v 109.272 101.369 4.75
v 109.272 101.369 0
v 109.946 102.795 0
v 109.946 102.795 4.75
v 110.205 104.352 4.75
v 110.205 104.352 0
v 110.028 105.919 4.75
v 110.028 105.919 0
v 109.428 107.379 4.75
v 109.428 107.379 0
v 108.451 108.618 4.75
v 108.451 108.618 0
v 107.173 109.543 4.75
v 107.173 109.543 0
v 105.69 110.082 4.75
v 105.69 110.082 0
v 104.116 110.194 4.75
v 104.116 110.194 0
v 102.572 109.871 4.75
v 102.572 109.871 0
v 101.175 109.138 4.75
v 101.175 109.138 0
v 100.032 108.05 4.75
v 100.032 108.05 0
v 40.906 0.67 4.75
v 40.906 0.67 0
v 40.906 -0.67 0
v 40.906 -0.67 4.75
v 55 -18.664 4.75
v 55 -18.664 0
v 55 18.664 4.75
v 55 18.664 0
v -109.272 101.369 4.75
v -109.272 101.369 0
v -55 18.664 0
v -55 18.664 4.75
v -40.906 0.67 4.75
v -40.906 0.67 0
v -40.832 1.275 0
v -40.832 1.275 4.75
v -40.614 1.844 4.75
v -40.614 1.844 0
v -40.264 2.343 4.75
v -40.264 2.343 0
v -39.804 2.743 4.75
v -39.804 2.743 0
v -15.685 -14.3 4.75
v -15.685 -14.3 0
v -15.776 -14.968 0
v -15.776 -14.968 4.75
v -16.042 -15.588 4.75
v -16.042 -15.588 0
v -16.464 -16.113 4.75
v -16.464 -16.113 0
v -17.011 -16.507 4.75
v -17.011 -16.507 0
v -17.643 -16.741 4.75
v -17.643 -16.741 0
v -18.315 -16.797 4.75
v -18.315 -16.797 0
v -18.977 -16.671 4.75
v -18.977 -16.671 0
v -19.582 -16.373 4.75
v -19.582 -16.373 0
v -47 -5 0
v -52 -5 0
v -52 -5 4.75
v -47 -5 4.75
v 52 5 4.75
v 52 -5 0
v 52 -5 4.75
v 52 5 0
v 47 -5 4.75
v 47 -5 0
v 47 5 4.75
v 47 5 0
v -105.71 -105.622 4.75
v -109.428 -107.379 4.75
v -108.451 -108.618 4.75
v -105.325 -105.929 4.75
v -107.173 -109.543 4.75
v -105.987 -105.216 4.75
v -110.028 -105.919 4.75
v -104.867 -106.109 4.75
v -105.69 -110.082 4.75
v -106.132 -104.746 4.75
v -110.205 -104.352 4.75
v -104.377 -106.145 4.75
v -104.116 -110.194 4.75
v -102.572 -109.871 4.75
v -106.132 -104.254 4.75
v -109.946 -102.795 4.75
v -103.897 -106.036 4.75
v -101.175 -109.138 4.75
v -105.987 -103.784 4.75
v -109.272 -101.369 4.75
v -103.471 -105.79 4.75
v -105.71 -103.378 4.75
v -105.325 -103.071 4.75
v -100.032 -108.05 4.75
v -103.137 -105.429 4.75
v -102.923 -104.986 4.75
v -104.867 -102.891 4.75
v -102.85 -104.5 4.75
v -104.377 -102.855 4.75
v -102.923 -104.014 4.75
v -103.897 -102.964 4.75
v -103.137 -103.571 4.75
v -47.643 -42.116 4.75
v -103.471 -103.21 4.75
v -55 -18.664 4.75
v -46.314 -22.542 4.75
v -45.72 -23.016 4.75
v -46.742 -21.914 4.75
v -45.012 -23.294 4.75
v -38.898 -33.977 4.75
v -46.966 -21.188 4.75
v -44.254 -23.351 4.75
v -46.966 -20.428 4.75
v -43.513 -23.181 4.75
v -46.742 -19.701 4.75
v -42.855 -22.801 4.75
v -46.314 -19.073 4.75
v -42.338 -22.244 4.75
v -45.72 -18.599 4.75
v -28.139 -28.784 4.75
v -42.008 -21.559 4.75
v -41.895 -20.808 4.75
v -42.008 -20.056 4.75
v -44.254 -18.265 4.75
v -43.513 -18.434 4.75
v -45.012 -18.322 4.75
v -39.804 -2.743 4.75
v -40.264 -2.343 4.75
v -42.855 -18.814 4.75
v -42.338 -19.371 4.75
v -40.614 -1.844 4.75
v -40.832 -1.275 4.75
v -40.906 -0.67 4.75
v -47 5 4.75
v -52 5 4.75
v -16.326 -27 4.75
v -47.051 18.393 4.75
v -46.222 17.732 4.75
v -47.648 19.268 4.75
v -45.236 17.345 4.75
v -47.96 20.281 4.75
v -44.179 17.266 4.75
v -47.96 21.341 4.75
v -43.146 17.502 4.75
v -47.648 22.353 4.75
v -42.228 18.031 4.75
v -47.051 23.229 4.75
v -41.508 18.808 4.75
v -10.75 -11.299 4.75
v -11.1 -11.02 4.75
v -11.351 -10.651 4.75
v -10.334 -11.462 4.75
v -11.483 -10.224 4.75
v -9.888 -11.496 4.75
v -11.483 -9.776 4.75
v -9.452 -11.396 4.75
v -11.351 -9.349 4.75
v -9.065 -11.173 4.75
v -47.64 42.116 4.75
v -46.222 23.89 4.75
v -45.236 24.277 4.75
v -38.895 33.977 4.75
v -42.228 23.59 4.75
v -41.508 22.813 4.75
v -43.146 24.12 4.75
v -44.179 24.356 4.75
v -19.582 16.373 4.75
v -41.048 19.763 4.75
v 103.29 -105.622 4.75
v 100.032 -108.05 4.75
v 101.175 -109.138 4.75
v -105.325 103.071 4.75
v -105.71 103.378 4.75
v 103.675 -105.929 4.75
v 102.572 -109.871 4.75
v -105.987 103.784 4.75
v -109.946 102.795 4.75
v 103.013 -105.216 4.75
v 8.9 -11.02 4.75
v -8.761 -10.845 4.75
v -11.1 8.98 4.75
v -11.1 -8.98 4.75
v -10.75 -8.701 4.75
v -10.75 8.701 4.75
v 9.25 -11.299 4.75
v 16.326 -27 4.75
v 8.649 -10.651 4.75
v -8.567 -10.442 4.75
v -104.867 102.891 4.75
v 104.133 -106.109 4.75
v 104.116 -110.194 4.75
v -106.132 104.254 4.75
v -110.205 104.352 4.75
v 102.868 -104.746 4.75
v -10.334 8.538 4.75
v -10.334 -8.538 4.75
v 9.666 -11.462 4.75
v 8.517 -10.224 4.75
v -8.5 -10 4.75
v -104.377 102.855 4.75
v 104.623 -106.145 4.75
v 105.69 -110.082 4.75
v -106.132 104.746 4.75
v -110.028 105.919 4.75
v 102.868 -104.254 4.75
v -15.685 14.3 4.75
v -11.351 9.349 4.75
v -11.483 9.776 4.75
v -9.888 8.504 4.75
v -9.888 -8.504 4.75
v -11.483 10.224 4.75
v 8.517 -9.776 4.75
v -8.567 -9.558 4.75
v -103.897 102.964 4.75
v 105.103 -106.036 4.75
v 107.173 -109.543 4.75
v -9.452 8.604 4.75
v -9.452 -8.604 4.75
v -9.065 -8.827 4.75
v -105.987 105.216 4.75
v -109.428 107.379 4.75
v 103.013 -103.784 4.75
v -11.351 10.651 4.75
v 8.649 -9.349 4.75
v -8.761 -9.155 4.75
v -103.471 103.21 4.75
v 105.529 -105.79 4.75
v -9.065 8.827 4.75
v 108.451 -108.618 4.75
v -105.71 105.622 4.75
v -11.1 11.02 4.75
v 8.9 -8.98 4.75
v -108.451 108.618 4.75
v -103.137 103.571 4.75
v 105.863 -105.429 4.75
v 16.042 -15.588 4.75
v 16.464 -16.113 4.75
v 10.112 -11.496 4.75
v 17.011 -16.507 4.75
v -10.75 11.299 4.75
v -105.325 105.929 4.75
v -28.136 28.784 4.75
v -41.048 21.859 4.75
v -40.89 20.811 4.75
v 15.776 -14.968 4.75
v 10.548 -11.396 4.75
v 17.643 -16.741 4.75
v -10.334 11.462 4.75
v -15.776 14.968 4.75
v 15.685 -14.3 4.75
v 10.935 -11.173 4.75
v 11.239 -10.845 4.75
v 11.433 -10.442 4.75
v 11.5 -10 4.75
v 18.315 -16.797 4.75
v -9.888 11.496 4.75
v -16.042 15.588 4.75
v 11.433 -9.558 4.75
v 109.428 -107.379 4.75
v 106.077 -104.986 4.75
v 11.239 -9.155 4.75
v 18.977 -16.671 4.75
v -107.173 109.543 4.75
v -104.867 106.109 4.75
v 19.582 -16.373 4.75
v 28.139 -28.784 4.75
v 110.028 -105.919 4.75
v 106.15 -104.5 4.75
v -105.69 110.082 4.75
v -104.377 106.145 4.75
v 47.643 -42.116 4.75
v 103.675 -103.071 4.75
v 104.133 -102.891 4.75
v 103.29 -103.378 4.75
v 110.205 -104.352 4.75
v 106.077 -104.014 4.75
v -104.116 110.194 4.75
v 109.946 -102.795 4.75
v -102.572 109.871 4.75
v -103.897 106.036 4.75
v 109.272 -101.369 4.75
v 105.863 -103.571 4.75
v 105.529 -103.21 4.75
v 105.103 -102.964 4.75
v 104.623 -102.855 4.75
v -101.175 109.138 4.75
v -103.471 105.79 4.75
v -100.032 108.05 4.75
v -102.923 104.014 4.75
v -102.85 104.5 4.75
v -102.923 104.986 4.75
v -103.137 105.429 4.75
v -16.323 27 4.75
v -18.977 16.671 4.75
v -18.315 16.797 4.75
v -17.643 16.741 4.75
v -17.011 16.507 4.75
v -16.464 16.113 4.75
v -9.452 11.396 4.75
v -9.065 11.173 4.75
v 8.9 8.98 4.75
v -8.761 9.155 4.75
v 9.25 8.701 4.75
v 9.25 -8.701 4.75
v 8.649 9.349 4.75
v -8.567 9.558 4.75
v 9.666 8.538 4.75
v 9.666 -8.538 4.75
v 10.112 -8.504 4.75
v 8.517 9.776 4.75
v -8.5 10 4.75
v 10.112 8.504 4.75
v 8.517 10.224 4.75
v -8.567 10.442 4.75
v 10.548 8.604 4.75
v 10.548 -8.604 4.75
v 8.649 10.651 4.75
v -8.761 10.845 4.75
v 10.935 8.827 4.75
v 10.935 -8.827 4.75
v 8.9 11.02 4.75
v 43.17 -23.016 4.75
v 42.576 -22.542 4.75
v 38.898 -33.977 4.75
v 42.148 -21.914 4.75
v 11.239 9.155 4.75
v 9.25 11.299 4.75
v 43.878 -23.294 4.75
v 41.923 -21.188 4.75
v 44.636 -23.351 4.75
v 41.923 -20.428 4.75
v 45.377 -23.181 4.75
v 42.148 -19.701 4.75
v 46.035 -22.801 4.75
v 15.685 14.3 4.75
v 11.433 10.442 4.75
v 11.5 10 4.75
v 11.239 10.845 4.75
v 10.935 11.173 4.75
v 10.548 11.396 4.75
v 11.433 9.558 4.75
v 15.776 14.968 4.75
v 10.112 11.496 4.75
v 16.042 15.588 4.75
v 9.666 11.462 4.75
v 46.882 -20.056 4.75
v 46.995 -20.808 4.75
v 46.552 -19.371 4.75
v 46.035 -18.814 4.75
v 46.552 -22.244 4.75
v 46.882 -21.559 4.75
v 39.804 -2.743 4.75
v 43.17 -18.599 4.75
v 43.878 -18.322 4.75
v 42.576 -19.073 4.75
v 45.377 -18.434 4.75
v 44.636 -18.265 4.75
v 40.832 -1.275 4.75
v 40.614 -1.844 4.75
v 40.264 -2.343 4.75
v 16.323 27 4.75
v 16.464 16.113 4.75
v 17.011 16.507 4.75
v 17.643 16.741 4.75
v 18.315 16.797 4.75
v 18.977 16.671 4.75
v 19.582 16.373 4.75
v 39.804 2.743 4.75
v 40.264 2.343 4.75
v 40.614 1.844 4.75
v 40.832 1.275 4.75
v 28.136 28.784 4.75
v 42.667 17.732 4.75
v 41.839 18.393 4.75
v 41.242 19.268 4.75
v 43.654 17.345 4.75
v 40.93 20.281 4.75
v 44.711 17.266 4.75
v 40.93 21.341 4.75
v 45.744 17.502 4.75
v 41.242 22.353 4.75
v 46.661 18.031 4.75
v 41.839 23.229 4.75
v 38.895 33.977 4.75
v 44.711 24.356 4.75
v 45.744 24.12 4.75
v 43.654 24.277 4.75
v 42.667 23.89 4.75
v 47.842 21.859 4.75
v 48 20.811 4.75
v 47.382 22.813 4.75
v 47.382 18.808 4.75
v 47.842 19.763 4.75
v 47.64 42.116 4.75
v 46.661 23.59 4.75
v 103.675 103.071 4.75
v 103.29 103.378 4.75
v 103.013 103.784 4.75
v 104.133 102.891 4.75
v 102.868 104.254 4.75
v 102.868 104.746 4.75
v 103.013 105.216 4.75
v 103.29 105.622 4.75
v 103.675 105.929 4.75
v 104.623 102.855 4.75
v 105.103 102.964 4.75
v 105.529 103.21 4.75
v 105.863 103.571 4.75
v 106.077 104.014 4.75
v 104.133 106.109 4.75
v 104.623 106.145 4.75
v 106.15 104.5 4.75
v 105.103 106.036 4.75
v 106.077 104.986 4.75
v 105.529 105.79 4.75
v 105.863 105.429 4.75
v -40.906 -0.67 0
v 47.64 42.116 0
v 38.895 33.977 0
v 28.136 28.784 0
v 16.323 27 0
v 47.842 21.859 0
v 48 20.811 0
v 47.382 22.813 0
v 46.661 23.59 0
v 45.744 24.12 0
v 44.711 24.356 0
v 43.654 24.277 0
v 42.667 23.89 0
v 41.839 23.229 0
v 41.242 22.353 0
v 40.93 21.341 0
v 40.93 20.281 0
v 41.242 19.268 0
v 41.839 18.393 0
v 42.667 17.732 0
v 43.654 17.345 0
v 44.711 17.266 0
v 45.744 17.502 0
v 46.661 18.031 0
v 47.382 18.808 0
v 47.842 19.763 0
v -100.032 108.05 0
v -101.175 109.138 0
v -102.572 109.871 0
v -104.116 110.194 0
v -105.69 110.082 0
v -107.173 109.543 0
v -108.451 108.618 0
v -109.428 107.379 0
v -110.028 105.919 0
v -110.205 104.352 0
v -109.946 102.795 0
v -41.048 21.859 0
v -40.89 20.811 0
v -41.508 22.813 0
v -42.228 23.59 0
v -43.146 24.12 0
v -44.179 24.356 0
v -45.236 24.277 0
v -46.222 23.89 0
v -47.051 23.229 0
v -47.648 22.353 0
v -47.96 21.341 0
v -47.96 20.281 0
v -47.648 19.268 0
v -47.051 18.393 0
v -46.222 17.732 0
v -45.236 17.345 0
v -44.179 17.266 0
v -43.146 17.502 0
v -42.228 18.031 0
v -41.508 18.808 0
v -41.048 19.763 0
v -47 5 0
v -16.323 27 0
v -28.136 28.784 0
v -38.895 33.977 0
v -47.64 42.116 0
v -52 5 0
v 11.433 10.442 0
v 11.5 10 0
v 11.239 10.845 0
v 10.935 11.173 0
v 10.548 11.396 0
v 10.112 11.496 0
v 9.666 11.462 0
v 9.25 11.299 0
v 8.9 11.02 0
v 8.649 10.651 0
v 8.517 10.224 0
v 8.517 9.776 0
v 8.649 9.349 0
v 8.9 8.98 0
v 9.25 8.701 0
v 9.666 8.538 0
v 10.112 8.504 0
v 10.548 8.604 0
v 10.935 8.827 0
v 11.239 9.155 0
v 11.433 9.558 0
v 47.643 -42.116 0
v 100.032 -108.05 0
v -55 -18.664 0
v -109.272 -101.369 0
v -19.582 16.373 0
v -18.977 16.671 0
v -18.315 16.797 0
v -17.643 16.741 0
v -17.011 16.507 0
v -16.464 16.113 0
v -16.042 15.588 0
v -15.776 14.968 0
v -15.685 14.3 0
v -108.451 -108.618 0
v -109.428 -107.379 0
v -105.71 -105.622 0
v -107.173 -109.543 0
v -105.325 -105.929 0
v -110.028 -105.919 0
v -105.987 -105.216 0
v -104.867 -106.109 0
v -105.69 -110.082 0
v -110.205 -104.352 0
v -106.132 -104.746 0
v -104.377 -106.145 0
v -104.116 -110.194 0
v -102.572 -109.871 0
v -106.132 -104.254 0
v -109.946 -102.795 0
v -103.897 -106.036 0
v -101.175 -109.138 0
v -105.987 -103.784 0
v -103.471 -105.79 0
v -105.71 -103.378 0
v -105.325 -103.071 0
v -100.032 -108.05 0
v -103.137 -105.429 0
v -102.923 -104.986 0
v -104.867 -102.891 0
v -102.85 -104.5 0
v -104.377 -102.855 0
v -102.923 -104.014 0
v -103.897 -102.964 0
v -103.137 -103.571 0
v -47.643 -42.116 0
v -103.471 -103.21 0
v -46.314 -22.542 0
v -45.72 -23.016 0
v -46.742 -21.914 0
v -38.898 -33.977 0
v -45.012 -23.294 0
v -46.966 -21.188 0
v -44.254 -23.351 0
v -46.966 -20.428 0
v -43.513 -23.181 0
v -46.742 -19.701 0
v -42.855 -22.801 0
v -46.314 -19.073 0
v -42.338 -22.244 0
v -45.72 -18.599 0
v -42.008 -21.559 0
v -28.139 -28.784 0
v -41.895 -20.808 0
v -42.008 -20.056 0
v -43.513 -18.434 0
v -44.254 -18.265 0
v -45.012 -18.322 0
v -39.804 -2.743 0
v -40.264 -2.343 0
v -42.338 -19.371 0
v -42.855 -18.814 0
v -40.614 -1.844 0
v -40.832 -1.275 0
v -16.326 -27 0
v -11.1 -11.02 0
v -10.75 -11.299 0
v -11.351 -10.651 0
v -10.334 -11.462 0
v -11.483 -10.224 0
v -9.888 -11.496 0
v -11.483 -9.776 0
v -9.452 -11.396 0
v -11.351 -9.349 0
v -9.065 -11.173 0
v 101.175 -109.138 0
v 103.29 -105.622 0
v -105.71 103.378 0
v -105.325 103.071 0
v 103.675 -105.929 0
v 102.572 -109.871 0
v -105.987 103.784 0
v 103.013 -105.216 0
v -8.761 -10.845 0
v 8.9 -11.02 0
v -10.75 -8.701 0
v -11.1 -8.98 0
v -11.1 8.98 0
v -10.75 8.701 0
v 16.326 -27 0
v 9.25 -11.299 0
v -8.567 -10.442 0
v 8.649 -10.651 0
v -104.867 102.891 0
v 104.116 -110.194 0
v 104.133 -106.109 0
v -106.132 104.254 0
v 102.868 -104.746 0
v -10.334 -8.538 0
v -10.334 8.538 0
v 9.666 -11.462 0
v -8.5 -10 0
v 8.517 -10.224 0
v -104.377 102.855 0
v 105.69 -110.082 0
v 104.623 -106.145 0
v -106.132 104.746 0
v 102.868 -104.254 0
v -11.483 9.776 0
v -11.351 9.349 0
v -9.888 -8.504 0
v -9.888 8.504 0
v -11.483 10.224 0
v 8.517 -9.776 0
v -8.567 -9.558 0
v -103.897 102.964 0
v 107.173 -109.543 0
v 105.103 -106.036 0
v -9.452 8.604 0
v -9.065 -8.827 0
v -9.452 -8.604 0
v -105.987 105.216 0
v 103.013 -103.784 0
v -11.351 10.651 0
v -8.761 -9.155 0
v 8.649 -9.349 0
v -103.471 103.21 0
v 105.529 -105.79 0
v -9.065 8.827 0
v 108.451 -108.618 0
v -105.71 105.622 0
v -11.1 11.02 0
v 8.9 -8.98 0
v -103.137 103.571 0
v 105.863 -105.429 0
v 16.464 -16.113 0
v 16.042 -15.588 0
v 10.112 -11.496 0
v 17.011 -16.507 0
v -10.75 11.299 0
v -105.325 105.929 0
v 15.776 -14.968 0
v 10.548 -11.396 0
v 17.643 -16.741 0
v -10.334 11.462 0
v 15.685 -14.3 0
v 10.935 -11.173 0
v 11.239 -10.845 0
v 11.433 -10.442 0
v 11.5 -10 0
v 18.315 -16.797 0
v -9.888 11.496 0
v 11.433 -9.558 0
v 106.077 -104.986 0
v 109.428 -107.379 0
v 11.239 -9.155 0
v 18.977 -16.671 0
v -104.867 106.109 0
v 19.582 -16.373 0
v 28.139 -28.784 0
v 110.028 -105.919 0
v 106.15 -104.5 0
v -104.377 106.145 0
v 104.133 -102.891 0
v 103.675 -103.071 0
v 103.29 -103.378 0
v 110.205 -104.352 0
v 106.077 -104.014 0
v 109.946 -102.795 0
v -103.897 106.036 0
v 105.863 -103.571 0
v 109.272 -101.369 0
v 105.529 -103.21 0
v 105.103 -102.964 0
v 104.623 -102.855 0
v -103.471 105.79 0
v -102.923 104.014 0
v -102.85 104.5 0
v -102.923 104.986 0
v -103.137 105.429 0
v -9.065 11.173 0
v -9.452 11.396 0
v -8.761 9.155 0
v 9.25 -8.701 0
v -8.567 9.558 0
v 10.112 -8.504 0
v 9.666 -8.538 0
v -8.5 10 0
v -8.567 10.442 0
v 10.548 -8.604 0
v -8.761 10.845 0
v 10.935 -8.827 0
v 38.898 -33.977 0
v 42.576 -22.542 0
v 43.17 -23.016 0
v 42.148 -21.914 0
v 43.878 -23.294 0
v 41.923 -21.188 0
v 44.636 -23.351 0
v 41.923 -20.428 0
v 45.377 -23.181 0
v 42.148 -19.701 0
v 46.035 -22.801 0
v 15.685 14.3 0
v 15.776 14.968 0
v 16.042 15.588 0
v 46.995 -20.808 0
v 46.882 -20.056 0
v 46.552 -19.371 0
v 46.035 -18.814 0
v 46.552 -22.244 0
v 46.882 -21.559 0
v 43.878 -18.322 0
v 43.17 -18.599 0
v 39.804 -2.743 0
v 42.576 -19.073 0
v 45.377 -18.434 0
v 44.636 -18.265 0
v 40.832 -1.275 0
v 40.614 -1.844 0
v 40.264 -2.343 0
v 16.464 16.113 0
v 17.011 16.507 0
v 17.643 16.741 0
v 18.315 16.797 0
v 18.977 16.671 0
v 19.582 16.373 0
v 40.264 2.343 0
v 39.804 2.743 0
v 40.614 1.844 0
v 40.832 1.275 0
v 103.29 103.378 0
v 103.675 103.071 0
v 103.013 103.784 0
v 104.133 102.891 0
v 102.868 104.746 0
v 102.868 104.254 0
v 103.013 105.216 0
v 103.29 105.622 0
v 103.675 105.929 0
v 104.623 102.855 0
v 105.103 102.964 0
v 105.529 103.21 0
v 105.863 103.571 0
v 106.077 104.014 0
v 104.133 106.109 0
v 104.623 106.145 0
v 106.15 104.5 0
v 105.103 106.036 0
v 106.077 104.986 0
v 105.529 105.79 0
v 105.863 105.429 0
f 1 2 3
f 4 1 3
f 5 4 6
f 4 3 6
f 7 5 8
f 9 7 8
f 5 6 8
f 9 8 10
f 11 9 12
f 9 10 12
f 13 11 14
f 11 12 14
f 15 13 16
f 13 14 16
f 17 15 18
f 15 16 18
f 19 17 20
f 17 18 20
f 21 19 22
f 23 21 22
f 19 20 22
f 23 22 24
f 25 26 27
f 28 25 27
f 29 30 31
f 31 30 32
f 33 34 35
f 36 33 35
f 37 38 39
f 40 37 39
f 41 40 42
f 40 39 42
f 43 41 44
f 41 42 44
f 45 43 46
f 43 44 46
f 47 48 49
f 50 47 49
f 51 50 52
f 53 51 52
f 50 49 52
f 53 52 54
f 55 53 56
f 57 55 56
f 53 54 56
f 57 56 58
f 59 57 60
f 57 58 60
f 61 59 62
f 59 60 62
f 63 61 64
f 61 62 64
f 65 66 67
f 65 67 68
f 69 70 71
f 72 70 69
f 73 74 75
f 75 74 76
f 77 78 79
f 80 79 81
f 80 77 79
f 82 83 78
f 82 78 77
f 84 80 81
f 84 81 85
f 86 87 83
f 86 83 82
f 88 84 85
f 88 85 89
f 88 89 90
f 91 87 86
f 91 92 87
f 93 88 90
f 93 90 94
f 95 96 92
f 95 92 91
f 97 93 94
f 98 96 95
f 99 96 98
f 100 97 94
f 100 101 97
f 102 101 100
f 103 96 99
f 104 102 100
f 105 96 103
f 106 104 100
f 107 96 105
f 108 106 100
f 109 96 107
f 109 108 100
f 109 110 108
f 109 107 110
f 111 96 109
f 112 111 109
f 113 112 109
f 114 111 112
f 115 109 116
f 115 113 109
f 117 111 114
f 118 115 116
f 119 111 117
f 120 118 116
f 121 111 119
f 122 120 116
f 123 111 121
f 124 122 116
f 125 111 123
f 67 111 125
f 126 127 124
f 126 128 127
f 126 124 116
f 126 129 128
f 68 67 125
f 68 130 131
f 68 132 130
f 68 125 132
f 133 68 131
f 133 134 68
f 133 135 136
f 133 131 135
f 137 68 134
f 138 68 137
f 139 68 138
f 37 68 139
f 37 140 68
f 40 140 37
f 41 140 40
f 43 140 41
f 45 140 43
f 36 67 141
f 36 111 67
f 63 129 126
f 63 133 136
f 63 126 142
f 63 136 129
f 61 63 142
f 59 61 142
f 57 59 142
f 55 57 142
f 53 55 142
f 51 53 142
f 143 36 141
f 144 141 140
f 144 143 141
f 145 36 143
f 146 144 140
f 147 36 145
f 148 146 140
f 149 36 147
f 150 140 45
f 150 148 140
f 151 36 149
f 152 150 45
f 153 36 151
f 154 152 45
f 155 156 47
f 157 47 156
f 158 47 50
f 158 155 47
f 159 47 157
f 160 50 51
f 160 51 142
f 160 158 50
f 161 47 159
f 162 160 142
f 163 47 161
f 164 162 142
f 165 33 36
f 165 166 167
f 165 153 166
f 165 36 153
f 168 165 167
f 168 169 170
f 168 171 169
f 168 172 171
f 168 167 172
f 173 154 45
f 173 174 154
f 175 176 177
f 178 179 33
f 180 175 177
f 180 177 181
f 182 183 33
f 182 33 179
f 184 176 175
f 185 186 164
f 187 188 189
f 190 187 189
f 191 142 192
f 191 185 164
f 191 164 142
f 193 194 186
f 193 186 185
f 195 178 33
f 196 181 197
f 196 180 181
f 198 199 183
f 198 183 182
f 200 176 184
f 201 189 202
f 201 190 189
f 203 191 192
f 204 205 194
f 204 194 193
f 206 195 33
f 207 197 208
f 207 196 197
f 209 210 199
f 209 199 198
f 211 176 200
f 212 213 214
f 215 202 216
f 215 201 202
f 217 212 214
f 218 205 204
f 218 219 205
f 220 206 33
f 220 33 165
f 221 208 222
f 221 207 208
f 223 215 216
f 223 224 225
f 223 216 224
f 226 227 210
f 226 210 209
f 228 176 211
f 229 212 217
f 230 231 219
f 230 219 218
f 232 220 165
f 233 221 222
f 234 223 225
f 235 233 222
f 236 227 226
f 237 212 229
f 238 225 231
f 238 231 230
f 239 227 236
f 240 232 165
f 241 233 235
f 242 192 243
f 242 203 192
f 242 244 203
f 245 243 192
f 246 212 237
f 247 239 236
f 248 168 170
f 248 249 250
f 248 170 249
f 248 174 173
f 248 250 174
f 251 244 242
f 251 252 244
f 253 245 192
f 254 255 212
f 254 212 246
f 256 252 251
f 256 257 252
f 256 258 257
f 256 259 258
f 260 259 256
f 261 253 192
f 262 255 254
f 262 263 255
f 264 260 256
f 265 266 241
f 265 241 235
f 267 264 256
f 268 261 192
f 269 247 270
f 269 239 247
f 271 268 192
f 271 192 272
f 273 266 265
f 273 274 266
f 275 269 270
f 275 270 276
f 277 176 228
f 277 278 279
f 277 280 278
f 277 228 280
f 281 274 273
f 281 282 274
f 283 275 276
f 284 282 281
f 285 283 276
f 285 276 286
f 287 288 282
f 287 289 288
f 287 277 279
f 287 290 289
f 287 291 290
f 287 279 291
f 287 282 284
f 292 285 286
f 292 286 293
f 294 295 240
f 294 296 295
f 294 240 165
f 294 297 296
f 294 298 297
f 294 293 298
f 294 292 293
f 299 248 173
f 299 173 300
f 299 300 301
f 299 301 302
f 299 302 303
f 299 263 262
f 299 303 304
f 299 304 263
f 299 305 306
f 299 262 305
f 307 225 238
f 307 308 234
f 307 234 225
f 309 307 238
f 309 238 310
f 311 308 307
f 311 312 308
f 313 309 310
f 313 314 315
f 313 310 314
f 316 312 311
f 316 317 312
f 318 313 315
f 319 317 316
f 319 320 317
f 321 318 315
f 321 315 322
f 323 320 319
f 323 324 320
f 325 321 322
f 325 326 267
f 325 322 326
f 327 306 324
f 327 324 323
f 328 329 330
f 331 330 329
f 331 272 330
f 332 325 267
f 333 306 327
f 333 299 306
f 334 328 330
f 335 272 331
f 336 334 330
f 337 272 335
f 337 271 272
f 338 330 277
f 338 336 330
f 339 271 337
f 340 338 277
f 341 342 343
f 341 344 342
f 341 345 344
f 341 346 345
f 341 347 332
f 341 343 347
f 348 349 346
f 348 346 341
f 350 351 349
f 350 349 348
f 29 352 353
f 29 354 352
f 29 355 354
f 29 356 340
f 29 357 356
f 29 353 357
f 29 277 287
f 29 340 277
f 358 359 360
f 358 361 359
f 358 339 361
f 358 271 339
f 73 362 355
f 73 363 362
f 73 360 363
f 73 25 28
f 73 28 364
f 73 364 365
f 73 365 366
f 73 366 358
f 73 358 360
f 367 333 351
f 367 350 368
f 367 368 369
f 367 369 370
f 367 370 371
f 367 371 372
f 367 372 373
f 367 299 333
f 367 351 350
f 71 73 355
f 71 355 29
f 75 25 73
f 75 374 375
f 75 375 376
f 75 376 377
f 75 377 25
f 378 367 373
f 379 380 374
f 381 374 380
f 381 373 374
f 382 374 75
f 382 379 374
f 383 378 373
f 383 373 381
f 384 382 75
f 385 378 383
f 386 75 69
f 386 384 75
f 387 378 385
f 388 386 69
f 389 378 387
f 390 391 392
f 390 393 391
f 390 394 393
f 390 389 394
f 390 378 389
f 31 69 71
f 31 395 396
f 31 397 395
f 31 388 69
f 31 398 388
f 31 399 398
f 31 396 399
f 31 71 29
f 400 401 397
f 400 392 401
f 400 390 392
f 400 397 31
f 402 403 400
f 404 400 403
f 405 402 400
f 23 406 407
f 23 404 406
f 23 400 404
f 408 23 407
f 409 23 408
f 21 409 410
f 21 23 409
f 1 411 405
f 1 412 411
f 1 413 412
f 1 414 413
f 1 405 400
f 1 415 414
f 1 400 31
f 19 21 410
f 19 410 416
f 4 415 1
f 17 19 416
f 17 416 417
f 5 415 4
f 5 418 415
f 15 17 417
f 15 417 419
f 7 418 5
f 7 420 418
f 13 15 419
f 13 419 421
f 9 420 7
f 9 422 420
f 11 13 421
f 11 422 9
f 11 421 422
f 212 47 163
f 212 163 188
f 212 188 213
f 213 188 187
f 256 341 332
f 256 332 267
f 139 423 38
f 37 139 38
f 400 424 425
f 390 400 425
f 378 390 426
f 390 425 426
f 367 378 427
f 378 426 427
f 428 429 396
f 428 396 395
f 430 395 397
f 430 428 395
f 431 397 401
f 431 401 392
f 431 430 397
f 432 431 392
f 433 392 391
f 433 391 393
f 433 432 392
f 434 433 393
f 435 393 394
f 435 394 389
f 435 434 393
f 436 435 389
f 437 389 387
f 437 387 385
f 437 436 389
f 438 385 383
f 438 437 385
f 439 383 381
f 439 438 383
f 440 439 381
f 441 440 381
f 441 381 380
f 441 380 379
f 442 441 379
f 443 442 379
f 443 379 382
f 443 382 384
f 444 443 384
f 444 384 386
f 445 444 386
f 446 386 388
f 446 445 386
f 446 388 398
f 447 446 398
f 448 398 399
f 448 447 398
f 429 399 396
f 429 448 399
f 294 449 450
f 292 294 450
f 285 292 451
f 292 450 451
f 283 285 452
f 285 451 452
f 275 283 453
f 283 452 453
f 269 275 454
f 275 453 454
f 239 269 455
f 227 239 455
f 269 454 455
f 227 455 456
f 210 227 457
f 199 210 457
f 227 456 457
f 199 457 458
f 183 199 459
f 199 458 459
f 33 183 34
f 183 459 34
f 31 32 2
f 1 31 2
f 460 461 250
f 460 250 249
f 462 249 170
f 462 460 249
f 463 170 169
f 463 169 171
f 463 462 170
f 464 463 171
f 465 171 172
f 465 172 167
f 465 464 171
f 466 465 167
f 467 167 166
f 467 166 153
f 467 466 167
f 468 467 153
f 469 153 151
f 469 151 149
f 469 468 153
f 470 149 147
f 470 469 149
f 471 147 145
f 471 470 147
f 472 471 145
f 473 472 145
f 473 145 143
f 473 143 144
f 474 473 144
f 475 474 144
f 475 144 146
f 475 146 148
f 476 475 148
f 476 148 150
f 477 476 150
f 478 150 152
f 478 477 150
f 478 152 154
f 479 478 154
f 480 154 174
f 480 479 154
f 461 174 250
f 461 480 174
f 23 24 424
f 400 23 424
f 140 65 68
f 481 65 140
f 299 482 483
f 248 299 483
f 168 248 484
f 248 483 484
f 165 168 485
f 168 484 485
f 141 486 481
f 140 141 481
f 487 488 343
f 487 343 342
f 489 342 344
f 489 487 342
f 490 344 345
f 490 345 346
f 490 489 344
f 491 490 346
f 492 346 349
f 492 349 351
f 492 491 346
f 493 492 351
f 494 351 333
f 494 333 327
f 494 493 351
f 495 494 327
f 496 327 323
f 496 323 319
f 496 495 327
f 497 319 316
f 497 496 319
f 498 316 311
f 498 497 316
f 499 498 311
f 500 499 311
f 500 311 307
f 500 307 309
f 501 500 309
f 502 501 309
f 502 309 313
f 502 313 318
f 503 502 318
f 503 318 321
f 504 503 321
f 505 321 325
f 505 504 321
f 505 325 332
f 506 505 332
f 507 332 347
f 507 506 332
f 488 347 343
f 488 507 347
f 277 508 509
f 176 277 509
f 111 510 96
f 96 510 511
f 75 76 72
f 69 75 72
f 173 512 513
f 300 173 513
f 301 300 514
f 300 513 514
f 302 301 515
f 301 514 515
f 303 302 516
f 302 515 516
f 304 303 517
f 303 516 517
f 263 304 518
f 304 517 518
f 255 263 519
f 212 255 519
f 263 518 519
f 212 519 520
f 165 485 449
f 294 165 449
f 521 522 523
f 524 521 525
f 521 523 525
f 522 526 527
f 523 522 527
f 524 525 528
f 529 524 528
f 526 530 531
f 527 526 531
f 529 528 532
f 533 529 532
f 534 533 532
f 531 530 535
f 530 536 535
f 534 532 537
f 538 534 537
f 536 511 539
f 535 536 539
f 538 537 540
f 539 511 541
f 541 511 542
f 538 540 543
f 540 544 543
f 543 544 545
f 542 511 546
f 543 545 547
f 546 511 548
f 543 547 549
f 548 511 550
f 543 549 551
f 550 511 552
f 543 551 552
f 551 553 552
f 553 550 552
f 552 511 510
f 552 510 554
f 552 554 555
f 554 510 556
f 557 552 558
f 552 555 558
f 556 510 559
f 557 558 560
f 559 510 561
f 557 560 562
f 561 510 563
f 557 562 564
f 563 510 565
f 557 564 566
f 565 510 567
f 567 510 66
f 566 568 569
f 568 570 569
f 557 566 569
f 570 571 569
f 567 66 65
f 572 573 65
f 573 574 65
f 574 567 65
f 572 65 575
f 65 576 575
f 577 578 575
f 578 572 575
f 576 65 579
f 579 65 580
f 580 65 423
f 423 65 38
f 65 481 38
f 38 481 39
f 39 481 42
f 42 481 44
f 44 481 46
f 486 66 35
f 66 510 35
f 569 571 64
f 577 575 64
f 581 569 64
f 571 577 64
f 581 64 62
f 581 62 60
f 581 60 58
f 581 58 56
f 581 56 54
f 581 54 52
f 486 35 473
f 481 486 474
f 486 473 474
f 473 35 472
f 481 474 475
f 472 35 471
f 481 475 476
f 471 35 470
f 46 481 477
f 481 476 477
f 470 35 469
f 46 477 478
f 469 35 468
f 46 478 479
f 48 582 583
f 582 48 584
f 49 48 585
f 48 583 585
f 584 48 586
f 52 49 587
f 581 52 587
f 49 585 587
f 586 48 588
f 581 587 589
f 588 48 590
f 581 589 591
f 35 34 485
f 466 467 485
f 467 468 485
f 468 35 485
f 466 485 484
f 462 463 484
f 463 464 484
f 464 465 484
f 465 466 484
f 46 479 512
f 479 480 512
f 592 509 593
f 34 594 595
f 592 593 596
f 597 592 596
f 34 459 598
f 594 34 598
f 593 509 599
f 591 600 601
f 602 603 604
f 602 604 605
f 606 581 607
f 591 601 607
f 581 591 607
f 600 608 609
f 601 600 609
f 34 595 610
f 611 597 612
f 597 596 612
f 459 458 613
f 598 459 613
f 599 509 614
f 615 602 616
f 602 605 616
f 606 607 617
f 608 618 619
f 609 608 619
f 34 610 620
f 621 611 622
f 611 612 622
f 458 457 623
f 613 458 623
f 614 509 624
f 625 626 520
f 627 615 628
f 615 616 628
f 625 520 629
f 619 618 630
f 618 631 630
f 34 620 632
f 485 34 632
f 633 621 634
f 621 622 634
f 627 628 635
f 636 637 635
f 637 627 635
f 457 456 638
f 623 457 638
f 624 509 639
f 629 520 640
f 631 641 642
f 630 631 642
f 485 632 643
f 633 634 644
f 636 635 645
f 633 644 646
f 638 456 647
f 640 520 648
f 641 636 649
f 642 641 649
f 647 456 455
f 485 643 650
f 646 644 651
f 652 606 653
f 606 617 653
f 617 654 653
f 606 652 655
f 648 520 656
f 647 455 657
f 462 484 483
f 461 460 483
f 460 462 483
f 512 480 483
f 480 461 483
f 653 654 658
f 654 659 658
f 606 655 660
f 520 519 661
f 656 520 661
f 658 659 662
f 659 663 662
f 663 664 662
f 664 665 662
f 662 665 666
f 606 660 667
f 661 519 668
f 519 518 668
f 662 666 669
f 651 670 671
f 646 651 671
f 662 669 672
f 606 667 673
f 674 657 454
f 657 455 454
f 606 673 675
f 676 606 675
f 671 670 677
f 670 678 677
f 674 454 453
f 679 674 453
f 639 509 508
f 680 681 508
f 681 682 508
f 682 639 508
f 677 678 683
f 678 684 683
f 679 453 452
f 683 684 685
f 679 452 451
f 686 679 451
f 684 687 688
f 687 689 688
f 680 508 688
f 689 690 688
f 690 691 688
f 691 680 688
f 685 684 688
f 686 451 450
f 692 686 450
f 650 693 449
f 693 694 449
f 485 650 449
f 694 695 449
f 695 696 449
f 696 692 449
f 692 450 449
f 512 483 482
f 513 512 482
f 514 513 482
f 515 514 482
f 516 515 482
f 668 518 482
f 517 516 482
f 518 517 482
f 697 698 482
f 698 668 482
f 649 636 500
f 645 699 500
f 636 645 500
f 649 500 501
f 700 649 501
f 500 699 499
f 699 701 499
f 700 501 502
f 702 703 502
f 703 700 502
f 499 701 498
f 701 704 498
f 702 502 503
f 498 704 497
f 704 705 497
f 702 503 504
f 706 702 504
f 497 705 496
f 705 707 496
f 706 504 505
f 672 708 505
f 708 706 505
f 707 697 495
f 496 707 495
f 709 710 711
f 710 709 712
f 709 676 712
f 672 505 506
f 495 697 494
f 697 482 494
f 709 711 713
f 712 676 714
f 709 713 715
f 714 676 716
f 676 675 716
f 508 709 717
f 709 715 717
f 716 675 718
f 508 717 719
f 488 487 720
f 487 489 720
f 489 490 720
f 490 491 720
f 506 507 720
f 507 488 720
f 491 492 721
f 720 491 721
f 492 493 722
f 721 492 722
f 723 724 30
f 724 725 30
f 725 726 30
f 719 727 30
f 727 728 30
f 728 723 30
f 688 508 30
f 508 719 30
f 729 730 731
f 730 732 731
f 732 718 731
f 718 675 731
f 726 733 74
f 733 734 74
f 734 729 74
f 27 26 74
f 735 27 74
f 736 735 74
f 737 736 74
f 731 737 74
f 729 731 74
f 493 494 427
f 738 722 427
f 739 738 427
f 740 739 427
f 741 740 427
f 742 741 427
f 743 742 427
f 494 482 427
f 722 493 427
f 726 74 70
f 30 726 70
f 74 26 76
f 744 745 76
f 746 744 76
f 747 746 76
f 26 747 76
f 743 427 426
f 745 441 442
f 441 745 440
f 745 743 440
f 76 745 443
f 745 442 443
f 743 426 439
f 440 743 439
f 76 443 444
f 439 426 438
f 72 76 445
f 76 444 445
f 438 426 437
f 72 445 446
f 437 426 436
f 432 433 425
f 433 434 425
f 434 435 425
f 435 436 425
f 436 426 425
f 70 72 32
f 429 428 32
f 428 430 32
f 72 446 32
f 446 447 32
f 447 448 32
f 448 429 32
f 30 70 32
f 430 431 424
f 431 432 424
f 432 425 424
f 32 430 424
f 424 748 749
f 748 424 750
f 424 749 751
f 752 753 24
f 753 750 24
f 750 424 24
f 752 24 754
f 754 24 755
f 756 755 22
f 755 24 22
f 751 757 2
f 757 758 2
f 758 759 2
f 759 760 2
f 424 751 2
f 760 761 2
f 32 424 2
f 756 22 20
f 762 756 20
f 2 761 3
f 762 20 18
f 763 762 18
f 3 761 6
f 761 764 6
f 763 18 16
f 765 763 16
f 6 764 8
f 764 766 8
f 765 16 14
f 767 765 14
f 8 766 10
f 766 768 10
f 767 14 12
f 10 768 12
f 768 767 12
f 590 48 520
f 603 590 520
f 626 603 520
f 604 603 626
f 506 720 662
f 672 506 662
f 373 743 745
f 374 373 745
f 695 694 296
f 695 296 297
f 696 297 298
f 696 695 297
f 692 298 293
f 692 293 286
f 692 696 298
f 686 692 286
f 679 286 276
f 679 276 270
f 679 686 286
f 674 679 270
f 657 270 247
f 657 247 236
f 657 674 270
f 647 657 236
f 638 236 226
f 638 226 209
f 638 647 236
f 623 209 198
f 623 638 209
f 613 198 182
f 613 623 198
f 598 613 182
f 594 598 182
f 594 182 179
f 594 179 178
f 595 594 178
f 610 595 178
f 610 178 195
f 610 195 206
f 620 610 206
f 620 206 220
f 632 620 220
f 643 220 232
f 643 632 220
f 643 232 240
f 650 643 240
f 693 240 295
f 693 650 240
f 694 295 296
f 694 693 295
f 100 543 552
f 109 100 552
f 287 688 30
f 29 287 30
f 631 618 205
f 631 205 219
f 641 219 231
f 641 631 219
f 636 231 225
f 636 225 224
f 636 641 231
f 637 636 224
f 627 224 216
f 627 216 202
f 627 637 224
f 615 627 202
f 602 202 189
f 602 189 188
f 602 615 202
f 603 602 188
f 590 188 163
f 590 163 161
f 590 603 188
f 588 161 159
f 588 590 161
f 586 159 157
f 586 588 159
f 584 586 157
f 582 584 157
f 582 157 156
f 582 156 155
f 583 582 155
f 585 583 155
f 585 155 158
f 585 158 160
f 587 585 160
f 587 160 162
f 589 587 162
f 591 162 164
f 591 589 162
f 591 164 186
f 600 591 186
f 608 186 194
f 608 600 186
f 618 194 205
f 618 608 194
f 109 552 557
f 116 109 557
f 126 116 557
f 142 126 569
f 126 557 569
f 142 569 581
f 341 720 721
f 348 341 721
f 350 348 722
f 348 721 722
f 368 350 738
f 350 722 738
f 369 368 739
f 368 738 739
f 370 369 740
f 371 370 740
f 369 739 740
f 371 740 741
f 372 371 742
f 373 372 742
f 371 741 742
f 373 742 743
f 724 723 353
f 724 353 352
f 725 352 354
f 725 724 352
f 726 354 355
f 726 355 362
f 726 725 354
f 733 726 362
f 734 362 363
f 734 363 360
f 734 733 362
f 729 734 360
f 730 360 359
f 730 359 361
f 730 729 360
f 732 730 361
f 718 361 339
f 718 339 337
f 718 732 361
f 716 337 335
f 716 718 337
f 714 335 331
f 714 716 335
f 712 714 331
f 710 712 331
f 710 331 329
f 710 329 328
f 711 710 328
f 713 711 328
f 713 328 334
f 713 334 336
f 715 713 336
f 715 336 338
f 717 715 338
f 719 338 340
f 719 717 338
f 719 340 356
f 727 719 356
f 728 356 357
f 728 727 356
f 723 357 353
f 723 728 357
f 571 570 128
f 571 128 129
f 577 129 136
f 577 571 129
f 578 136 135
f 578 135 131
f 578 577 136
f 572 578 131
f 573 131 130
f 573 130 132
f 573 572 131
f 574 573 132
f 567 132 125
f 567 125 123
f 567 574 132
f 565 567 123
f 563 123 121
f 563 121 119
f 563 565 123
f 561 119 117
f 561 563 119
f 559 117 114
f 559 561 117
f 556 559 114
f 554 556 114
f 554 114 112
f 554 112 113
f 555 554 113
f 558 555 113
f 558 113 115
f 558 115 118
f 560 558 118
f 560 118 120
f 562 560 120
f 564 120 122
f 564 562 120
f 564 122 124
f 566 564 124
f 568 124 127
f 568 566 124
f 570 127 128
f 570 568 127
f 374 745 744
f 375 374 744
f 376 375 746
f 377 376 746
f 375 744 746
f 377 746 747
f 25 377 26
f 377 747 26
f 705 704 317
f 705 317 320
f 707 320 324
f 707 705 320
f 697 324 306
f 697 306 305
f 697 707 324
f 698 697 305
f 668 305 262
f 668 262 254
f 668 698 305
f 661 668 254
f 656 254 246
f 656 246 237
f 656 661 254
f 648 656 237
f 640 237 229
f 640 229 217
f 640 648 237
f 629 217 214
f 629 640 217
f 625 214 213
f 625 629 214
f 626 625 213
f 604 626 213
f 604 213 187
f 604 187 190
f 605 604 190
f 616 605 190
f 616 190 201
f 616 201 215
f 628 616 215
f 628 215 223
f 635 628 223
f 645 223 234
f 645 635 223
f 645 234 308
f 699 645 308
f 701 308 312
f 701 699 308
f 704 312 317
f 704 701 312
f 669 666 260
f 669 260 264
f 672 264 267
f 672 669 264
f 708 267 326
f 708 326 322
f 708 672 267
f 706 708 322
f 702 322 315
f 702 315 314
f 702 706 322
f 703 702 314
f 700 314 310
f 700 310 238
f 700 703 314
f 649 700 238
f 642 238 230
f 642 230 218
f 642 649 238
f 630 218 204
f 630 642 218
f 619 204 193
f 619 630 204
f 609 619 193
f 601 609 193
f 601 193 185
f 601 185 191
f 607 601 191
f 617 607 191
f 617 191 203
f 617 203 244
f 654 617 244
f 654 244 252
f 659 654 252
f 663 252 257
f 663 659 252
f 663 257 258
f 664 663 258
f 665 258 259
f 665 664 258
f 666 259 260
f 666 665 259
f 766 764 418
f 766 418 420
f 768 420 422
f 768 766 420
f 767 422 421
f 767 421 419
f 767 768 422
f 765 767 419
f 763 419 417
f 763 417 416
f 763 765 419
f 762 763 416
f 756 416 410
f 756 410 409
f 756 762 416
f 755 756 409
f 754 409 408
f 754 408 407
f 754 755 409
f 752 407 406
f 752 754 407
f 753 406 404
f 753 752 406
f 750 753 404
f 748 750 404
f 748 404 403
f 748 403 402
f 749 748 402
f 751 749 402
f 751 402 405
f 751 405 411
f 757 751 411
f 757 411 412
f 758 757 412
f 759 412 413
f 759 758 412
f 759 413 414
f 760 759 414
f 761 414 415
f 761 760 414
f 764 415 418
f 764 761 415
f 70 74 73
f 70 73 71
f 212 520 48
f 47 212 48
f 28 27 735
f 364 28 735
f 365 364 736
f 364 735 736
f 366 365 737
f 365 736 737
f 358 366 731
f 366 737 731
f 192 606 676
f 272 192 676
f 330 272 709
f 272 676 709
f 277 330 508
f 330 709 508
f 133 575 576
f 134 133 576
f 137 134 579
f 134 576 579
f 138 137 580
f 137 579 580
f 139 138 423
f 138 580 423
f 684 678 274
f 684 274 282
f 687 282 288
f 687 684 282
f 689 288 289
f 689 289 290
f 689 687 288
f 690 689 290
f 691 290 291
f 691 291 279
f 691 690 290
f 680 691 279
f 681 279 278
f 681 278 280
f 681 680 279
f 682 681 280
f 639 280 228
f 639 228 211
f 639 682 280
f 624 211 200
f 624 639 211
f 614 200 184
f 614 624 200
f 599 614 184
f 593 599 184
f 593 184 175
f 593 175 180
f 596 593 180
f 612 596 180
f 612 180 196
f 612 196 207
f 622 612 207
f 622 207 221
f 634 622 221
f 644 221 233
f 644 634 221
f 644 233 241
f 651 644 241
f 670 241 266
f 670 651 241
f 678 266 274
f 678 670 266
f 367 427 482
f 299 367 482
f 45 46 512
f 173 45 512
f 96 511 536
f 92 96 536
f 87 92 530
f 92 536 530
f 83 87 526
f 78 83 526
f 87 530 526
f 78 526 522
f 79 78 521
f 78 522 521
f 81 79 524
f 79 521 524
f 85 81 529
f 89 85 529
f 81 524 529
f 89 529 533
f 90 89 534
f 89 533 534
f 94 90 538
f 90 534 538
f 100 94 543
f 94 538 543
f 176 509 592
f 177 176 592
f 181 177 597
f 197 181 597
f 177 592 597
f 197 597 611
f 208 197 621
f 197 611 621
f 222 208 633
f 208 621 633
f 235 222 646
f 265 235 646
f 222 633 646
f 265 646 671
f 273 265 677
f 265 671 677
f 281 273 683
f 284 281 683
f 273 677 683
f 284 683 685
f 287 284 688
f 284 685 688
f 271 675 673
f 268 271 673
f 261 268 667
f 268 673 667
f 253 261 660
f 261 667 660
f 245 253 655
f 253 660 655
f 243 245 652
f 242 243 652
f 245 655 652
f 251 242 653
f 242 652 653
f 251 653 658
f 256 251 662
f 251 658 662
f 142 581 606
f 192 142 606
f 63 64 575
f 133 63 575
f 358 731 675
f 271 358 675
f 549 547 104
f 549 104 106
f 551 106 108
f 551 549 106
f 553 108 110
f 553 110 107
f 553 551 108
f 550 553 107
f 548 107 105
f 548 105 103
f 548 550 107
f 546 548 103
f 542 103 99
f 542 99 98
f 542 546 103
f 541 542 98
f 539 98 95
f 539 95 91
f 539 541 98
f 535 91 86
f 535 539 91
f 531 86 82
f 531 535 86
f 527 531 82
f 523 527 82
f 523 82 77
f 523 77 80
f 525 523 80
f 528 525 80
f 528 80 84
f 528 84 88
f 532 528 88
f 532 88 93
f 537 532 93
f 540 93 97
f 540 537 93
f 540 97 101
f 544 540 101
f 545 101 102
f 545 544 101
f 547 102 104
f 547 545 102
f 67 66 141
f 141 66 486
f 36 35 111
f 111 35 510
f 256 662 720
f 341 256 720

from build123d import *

# Parameters (mm, degrees)
F0_R     = 1.65
F0_R_2   = 2.55
F0_W     = 5
F0_H     = 10
F0_R_3   = 1.5
F0_R_4   = 3.555
F1_DEPTH = 4.75


# Not quite as in the source:
# - ends of sketch curves that miss each other by under 0.0002 mm in the source are joined


with BuildPart() as f1:
    # F0 (on Top) → F1 (new body)
    with BuildSketch(Plane.XY):
        with BuildLine():
            Line((-47.640397, 42.115595), (-100.031737, 108.050449))
            ThreePointArc((-100.031737, 108.050449), (-107.8442155419, 109.1246397394), (-109.2715048598, 101.368896092))
            Line((-109.2715048598, 101.368896092), (-54.999977, 18.664241))
            Line((-54.999977, 18.664241), (-54.999977, -18.664242))
            Line((-54.999977, -18.664242), (-109.271505, -101.368897))
            ThreePointArc((-109.271505, -101.368897), (-107.8441644553, -109.1246766812), (-100.031658534, -108.0503513703))
            Line((-100.031658534, -108.0503513703), (-47.643302, -42.116283))
            ThreePointArc((-47.643302, -42.116283), (-33.7130803066, -30.9767526972), (-16.325566, -27))
            Line((-16.325566, -27), (16.325565, -27))
            ThreePointArc((16.325565, -27), (33.7130793066, -30.9767526972), (47.6433013924, -42.1162826882))
            Line((47.6433013924, -42.1162826882), (100.031658, -108.050351))
            ThreePointArc((100.031658, -108.050351), (107.8441644255, -109.1246767027), (109.2715050175, -101.3688963323))
            Line((109.2715050175, -101.3688963323), (54.999976, -18.664242))
            Line((54.999976, -18.664242), (54.999976, 18.664241))
            Line((54.999976, 18.664241), (109.271504, 101.368896))
            ThreePointArc((109.271504, 101.368896), (107.8442155121, 109.1246397609), (100.0317360662, 108.0504489474))
            Line((100.0317360662, 108.0504489474), (47.640396, 42.115595))
            ThreePointArc((47.640396, 42.115595), (33.7103248028, 30.9765618002), (16.323206, 27))
            Line((16.323206, 27), (-16.323206, 27))
            ThreePointArc((-16.323206, 27), (-33.710325083, 30.9765619354), (-47.640397, 42.115595))
        make_face()
        with Locations((-104.5, -104.5)):
            Circle(F0_R, mode=Mode.SUBTRACT)
        with Locations((-44.444977, -20.807752)):
            Circle(F0_R_2, mode=Mode.SUBTRACT)
        with Locations((-49.499977, 0)):
            Rectangle(F0_W, F0_H, mode=Mode.SUBTRACT)
        with BuildLine():
            Line((-19.581953, -16.373154), (-39.803759, -2.743263))
            ThreePointArc((-39.803759, -2.743263), (-40.6136447533, -1.8442487652), (-40.906473, -0.670199))
            Line((-40.906473, -0.670199), (-40.906473, 0.670176))
            ThreePointArc((-40.906473, 0.670176), (-40.6136450793, 1.8442251525), (-39.8037598701, 2.7432388072))
            Line((-39.8037598701, 2.7432388072), (-19.581955, 16.373149))
            ThreePointArc((-19.581955, 16.373149), (-17.0106188475, 16.5072580793), (-15.684668, 14.300086))
            Line((-15.684668, 14.300086), (-15.684668, -14.30009))
            ThreePointArc((-15.684668, -14.30009), (-17.0106178687, -16.5072615586), (-19.581953, -16.373154))
        make_face(mode=Mode.SUBTRACT)
        with Locations((-10, -10)):
            Circle(F0_R_3, mode=Mode.SUBTRACT)
        with Locations((104.5, -104.5)):
            Circle(F0_R, mode=Mode.SUBTRACT)
        with Locations((10, -10)):
            Circle(F0_R_3, mode=Mode.SUBTRACT)
        with Locations((44.444976, -20.807752)):
            Circle(F0_R_2, mode=Mode.SUBTRACT)
        with BuildLine():
            Line((19.581954, 16.373149), (39.803759, 2.743239))
            ThreePointArc((39.803759, 2.743239), (40.6136440793, 1.8442251525), (40.906472, 0.670176))
            Line((40.906472, 0.670176), (40.906472, -0.670199))
            ThreePointArc((40.906472, -0.670199), (40.6136437533, -1.8442487652), (39.803757719, -2.7432625831))
            Line((39.803757719, -2.7432625831), (19.581952, -16.373154))
            ThreePointArc((19.581952, -16.373154), (17.0106168687, -16.5072615586), (15.684667, -14.30009))
            Line((15.684667, -14.30009), (15.684667, 14.300086))
            ThreePointArc((15.684667, 14.300086), (17.0106178475, 16.5072580793), (19.581954, 16.373149))
        make_face(mode=Mode.SUBTRACT)
        with Locations((49.499976, 0)):
            Rectangle(F0_W, F0_H, mode=Mode.SUBTRACT)
        with Locations((-44.444977, 20.810818)):
            Circle(F0_R_4, mode=Mode.SUBTRACT)
        with Locations((-10, 10)):
            Circle(F0_R_3, mode=Mode.SUBTRACT)
        with Locations((-104.5, 104.5)):
            Circle(F0_R, mode=Mode.SUBTRACT)
        with Locations((10, 10)):
            Circle(F0_R_3, mode=Mode.SUBTRACT)
        with Locations((44.444976, 20.810818)):
            Circle(F0_R_4, mode=Mode.SUBTRACT)
        with Locations((104.5, 104.5)):
            Circle(F0_R, mode=Mode.SUBTRACT)
    extrude(amount=F1_DEPTH)


solid = f1.part
